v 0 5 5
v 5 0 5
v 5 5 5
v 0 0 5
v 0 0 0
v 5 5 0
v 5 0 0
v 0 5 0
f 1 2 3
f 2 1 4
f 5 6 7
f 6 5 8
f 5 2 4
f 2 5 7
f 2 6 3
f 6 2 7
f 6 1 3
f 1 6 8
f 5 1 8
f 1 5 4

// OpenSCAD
// file: used_with_shared_var.scad
// use'd file that defines variables: one overlapping with the entry file, one unique
SharedVar = 99;
LibOnlyVar = 7;

module libModule(size) {
  cube(size);
}
// main file
use <used_with_shared_var.scad>

// Entry file redefines a variable that also exists in the use'd file.
// After compilation, SharedVar = 5 must appear at the top level.
SharedVar = 5;
EntryOnly = 10;

libModule(SharedVar);
